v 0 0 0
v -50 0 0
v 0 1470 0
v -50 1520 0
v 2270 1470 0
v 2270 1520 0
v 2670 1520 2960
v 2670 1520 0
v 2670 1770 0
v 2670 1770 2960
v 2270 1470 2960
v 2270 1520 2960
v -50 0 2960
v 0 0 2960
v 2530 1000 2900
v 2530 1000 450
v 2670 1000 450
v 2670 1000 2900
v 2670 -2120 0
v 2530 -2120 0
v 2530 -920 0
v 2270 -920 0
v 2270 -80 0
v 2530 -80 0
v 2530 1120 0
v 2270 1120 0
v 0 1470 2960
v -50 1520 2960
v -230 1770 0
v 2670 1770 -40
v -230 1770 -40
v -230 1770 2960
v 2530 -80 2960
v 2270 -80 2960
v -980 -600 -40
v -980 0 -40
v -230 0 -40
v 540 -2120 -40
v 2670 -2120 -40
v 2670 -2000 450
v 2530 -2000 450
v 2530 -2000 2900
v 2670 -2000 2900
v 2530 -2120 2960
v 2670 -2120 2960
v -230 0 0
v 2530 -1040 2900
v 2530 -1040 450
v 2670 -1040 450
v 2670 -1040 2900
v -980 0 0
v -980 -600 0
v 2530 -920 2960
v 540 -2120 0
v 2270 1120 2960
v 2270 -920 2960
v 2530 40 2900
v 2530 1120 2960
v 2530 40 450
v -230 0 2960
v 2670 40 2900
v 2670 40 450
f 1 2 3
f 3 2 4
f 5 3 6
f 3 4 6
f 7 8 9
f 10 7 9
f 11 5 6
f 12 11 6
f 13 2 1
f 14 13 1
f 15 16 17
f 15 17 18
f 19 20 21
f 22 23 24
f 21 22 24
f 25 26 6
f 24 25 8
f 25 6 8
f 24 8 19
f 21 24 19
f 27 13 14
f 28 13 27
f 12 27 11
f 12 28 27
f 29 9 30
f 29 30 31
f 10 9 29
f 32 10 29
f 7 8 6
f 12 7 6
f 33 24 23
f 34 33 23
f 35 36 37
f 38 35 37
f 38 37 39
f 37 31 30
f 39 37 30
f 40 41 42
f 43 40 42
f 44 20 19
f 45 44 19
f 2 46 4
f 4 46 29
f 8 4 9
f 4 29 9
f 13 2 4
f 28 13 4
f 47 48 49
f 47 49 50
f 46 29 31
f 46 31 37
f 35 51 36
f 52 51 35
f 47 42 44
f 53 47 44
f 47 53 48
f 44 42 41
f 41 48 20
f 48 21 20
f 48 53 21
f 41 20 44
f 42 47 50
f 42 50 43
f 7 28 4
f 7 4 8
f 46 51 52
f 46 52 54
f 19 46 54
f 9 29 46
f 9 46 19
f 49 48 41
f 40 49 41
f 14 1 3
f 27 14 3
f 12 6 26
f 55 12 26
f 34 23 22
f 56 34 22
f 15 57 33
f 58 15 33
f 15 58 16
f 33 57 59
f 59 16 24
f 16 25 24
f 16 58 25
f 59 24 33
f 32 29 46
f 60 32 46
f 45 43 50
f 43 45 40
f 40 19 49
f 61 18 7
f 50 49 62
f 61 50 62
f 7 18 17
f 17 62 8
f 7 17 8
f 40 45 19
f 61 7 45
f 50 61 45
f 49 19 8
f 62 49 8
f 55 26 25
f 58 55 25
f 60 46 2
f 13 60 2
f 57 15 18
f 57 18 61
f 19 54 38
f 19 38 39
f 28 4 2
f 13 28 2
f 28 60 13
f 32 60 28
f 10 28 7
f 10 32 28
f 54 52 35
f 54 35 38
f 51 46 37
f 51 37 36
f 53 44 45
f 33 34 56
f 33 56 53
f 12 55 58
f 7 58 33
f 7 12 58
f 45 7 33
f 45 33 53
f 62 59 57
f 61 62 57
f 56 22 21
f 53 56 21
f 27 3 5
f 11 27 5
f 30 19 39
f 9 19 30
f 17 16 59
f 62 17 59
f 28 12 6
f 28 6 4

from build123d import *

# Parameters (mm, degrees)
F1_DEPTH = 2960
F2_DEPTH = 2960
F3_DEPTH = 2960
F4_W     = 960
F4_H     = 2450
F5_DEPTH = 140.001
F7_DEPTH = 40


with BuildPart() as f1:
    # F0 (on Top) → F1 (new body)
    with BuildSketch(Plane.XY):
        Polygon((-50, 0), (0, 0), (0, 1470), (2270, 1470), (2270, 1520), (-50, 1520), align=None)
    extrude(amount=F1_DEPTH)


with BuildPart() as f2:
    # F0 (on Top) → F2 (new body, through all)
    with BuildSketch(Plane.XY):
        Polygon((2270, 1520), (2270, 1470), (2270, 1120), (2530, 1120), (2530, -80), (2270, -80), (2270, -920), (2530, -920), (2530, -2120), (2670, -2120), (2670, 1520), align=None)
    extrude(amount=F2_DEPTH)

    # F4 (on face) → F5 (cut, through all)
    with BuildSketch(Plane(origin=(2530, 0, 0), x_dir=(0, -1, 0), z_dir=(-1, 0, 0))):
        with Locations((-520, 1675)):
            Rectangle(F4_W, F4_H)
        with Locations((1520, 1675)):
            Rectangle(F4_W, F4_H)
    extrude(amount=-F5_DEPTH, mode=Mode.SUBTRACT)


with BuildPart() as f3:
    # F0 (on Top) → F3 (new body, through all)
    with BuildSketch(Plane.XY):
        Polygon((-230, 0), (-50, 0), (-50, 1520), (2270, 1520), (2670, 1520), (2670, 1770), (-230, 1770), align=None)
    extrude(amount=F3_DEPTH)


with BuildPart() as f7:
    # F6 (on Top) → F7 (new body)
    with BuildSketch(Plane.XY):
        Polygon((-230, 1770), (-230, 0), (-980, 0), (-980, -600), (540, -2120), (2670, -2120), (2670, 1520), (2670, 1770), align=None)
    extrude(amount=-F7_DEPTH)


solid = Compound([f1.part, f2.part, f3.part, f7.part])
